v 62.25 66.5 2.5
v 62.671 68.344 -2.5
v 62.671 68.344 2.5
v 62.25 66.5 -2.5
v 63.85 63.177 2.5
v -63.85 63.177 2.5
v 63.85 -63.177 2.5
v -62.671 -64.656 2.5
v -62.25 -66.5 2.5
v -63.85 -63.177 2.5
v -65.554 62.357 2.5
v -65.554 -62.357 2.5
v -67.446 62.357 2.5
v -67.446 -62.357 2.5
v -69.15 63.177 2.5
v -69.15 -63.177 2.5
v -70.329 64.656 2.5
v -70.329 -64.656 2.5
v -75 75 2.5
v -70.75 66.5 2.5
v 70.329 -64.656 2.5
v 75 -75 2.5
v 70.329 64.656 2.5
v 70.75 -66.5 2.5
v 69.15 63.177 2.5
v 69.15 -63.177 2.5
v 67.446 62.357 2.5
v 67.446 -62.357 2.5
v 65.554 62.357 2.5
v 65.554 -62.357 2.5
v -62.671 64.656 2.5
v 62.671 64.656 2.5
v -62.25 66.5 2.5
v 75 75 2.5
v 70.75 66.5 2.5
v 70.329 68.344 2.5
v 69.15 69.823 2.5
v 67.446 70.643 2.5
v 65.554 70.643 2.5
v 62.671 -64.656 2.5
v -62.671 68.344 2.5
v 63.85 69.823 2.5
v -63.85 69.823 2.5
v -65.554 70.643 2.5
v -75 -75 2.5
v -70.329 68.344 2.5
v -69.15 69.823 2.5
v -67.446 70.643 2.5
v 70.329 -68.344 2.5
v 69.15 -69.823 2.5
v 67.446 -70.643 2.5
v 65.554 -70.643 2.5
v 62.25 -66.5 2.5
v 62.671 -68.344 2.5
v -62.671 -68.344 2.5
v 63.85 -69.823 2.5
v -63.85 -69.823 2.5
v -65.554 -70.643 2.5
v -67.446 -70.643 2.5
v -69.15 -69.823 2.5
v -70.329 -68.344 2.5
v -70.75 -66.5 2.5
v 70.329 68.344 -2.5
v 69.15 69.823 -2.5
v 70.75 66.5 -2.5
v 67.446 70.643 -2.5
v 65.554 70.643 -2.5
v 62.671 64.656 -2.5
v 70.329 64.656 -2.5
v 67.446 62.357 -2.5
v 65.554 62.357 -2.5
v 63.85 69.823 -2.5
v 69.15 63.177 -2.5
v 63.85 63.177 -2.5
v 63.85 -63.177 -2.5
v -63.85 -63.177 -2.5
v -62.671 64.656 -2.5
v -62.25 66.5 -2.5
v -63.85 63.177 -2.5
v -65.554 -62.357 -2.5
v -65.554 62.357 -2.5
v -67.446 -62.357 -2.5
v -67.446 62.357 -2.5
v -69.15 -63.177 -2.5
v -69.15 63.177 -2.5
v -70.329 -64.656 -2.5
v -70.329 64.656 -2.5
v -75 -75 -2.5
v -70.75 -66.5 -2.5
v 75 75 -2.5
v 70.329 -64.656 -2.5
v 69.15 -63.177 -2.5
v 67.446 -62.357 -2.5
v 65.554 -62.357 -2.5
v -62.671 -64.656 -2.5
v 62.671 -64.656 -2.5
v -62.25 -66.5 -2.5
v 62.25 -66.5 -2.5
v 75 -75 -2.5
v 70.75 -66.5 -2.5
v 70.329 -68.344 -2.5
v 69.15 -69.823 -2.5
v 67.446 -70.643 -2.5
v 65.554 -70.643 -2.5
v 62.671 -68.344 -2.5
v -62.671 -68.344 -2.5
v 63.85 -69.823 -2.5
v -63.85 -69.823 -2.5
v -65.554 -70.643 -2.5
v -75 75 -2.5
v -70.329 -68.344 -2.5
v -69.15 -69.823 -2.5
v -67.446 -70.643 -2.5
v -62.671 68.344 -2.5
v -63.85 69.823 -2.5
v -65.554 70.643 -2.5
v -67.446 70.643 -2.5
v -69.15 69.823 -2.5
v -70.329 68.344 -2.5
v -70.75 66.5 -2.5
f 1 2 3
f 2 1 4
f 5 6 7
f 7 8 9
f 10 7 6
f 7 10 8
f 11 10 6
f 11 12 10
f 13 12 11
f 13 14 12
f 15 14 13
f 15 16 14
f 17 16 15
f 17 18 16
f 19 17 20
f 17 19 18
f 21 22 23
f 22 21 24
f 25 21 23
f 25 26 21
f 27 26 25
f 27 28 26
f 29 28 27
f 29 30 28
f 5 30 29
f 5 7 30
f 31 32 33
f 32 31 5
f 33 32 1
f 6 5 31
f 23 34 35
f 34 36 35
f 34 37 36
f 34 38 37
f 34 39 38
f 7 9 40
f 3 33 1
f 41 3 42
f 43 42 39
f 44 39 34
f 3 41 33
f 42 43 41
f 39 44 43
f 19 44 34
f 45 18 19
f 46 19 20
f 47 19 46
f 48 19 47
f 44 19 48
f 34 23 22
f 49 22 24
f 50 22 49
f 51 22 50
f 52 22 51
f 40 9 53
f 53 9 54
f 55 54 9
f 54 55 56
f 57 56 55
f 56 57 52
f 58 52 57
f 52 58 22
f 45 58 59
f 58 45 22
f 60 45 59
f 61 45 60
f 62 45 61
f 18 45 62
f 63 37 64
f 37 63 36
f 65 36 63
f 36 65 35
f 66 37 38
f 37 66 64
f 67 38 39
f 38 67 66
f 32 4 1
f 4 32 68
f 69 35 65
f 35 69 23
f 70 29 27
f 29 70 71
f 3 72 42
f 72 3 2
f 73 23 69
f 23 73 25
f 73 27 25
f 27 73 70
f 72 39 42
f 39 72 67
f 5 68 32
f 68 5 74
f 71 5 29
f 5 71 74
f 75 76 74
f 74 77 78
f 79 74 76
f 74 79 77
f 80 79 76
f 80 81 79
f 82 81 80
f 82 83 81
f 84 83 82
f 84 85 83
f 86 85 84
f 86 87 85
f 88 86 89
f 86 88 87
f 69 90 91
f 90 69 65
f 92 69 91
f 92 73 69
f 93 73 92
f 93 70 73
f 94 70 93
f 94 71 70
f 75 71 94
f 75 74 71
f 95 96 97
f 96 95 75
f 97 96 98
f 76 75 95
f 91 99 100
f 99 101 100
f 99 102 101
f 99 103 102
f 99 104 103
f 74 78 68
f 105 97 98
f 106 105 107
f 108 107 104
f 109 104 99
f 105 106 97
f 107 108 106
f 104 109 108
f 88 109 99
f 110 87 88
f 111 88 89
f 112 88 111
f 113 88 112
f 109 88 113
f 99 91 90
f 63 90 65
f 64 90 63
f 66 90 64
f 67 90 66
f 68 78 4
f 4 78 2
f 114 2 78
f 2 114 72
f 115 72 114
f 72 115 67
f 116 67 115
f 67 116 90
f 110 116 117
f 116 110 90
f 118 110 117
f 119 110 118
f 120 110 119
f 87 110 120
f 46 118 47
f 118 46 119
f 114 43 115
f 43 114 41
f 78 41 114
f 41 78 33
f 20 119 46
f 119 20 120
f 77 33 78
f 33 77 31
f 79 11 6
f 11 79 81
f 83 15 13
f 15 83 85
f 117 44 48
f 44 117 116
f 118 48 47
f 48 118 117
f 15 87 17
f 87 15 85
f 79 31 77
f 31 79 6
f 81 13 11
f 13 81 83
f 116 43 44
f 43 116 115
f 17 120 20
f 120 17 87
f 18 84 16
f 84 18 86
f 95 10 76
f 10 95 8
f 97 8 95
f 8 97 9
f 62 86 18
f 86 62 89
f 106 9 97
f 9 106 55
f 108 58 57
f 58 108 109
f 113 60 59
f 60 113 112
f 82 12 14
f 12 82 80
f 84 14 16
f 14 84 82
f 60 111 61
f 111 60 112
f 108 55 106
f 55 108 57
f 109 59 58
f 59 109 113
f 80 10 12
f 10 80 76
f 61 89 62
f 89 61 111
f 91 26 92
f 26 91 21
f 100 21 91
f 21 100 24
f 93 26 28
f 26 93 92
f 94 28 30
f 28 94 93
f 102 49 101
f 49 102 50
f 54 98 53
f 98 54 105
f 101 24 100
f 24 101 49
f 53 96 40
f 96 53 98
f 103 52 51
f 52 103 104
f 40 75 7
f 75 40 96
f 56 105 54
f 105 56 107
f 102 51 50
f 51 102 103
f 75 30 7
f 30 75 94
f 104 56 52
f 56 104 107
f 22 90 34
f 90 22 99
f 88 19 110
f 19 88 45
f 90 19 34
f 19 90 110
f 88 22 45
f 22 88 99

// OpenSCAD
// Generated by SolidPython 1.1.3 on 2024-01-15 23:59:08


difference() {
	cube(center = true, size = [150, 150, 5]);
	union() {
		translate(v = [66.5000000000, 66.5000000000]) {
			cylinder(center = true, h = 5, r = 4.2500000000);
		}
		translate(v = [-66.5000000000, 66.5000000000]) {
			cylinder(center = true, h = 5, r = 4.2500000000);
		}
		translate(v = [-66.5000000000, -66.5000000000]) {
			cylinder(center = true, h = 5, r = 4.2500000000);
		}
		translate(v = [66.5000000000, -66.5000000000]) {
			cylinder(center = true, h = 5, r = 4.2500000000);
		}
	}
}
/***********************************************
*********      SolidPython code:      **********
************************************************
 
import solid
import numpy as np
import numbers
import pudb
from solid.utils import *
import viewscad
import subprocess
import os
import os.path as osp
import math
import sys

chamfer_extrude=solid.import_scad("./chamfer_extrude.scad")
chamfer_extrude=chamfer_extrude.chamfer_extrude
r = viewscad.Renderer(width=800, height=800)

def debug(model,f_name,path="/home/ts/code/projects/mfd/designs/debug"):
    solid.scad_render_to_file(model,osp.join(path,f_name)+".scad")
#generate position list of wells using offset from center
wells_pos_from_center_4 = lambda offset: [[-offset,offset],
                                        [offset, offset],
                                        [-offset, -offset],
                                        [offset, -offset]]
wells_pos_from_center_2 = lambda offset: [[offset,0],
                                        [-offset,0]]

def make_well(dims,shape=None,height=None,dxf=False):
    def circle_cylinder():
        if dxf or (height is None):
            well = solid.circle(r=dims, segments=64)
        else:
            well = solid.cylinder(r=dims, h=height, segments=64, center = True)
        return well
    if dims is None:
        sys.exit("radius needs to be a number")
    if isinstance(dims, numbers.Number):
        well =circle_cylinder()
    elif len(dims)==1:
        if isinstance(dims[1], numbers.Number):
            well =circle_cylinder()
        else:
            sys.exit("radius needs to be a number")
    elif len(dims)==2:
        well = solid.square(dims,center = True)
    elif len(dims)==3:
        well = solid.cube(dims, center = True)
    return well

def wells_top_bottom(center_gap,device_dims=None,shape=None,height=None, positions = None, dxf = False,well_shape=None):
    if well_shape == None:
        well_shape = make_well(device_dims,shape=shape,height=height,dxf=dxf)
    wells = []
    if positions is None:
        offset = radius+radius/2.0
        positions = wells_pos_from_center_2(offset)
    if dxf or (height is None):
        height = 0
    for position in positions:
        if dxf:
            wells.append(solid.translate([position[0],position[1]])(well_shape))
        else:
            wells.append(solid.translate([position[0],position[1],height/2.0])(well_shape))
    return  union()(*wells)

#place wells in four corners 
def four_corner(radius,height=None, positions = None, dxf = False):
    #if well pos not specified set
    #to equally spaced by half radius
    if positions is None:
        offset = radius+radius/2.0
        positions = wells_pos_from_center_4(offset)
    if dxf or (height is None):
        height = 0
    #make wells at positions with specified radius and height
    wells = []
    for position in positions:
        #make circle if making dxf
        if dxf:
            well_shape = solid.circle(r=radius, segments=64)
            well_shape = solid.translate([position[0],position[1]])(well_shape)
        #if stl make cylinder
        else:
            well_shape = solid.cylinder(r=radius, h=height, segments=64, center = True)
            well_shape = solid.translate([position[0],position[1],height/2.0])(well_shape)
        wells.append(well_shape)
    return  union()(*wells)

#generate channels 
def make_channels(length,width,height=0,num_chans=1,max_chans=None,spacing=None, dxf = False,
                  rotate_channels=False):
    if dxf or (height is None):
        height = 0
    #if channel gap not defined, is equal to
    if spacing is None: spacing = width
    #calculate number of channels if fitting max num within given width
    if not max_chans is None:
        import math
        num_chans = math.floor((max_chans-spacing)/(width+spacing))
    #get total width of channel section  
    total_width = (width*num_chans)+(spacing*(num_chans-1))

    #make template channel
    #if rotate_channels: width, length = length, width
    if dxf:
        channel_t = solid.square([length,width],center = True)
    else:
        channel_t = solid.cube([length,width,height], center = True)

    #if number channels is even, offset the first channel to center its gap
    if num_chans % 2 == 0: centering = -(width/2.0+spacing/2.0)
    else: centering = 0
    #move template channel up to align bottom at z = 0 
    #and offset center if necessary
    if dxf:
        channel_t = solid.translate([0,centering])(channel_t)
    else:
        channel_t = solid.translate([0,centering,height/2.0])(channel_t)

    #if rotate_channels: length,width = width,length
    #start making the channels
    channels = []
    for i in range(num_chans):
        #if i=0 there is no translation
        #if i=1, we make the first channel adjacent to second
        direction = i

        #if i>=1, we add channels alternating left and right
        if i >= 1:
            direction = -(i/2.0)
            if i % 2 == 1: direction = (-direction)+0.5
                
        #make channel at right position and add it to channel list
        translation_coords = [0,direction*(width+spacing)]
        #if rotate_channels: translation_coords = [direction*(width+spacing),0]
        if dxf:
            channel = solid.translate(translation_coords)(channel_t)
        else:
            channel = solid.translate([*translation_coords,0])(channel_t)
        channels.append(channel)
    
    #group all channels as one object
    channels = union()(*channels)
    #compute the x,y,z dimensions in order to pass as arguments 
    #for construction of other parts of device (such as the chambers)
    measurements = {'x':(length/2.0,-length/2.0),
                    'y':(total_width/2.0,-total_width/2.0)}
    if not dxf:
        measurements['z'] = (height,0)
    if rotate_channels:
        channels = solid.rotate(90)(channels)
        measurements['x'],measurements['y']=measurements['y'],measurements['x']
    return channels,measurements

def make_chambers(msrs,height=None,extra=0,len_until=None,width=None, dxf = False):
    #computes x,y,z length
    total = lambda x : abs(x[0]) + abs(x[1])
    
    #if specific height if specified
    #otherwise use same height as channels
    if dxf:
        pass
    elif not height is None:
        msrs['z'] = (height,0)
    else:
        msrs['z'] = (0,0)
        
    #make copy of measurements from channels to modify chamber dimensions 
    #and add length to chambers as specified
    chamber_dims = msrs.copy()
    #calculate length of chamber to reach specified offset
    if not len_until is None:
        chamber_len = len_until-(msrs['x'][0])
    #or add specified length to channel length (if not specified, adds 0)
    else:
        chamber_len = msrs['x'][0]+extra
    #set the chamber length based 
    chamber_dims['x'] = (chamber_len/2.0,-(chamber_len/2.0))
    #compute final dimensions of chamber
    if not width is None:
        chamber_dims['y'] = (width/2.0,-width/2.0)
    chamber_dims = [total(size) for size in chamber_dims.values()]
        
    #calculate chamber translation offset to place adjacent to channels
    chamber_trslt = msrs['x'][0]+(chamber_len/2.0)
    #compute chamber translation coordinates to align with channels
    #x = 1 moves chamber above channels
    #x = -1 moves chamber below channels
    if dxf:
        trslt = lambda x : [x*(chamber_trslt),0]
    else:
        trslt = lambda x : [x*(chamber_trslt),0,msrs['z'][0]/2.0]
    
    #function to make chamber at top or at bottom 
    if dxf:
        move = lambda x : solid.translate(trslt(x))(solid.square(chamber_dims, center = True) )
    else:
        move = lambda x : solid.translate(trslt(x))(solid.cube(chamber_dims,center = True))
    #make top and bottom chambers and return them as grouped
    top = move(1)
    bottom = move(-1)
    #chambers=solid.rotate(90)(solid.union()(top,bottom))
    chambers=(solid.union()(top,bottom))

    return chambers

#create alignment features 
def alignment_features(unit,dims,grid_size, mask_size = None, alignment = "hollow", units_from_center = (2.5,2.5), corner_len=None):
    width = grid_size[0]*dims[0]
    length = grid_size[1]*dims[1]
    if mask_size is None and corner_len is None:
        corner_len = (dims[0] + dims[1]) /2 / 8
    corner = lambda thickness_div : solid.union()( solid.square([corner_len,corner_len/thickness_div],center=False), solid.square([corner_len/thickness_div,corner_len],center=False) )
    
    def make_full(thickness_div):
        thickness = corner_len/thickness_div
        tr = solid.translate([0, 0, 0 ])(solid.rotate(180)(corner(thickness_div)))
        tr = solid.translate([thickness/2,thickness/2,0])(tr)
        bl = solid.translate([0, 0, 0 ])(solid.rotate(0)(corner(thickness_div)))
        bl = solid.translate([-thickness/2,-thickness/2,0])(bl)
        return solid.union()(tr,bl)
    
    def make_hollow(thickness_div):
        thickness = corner_len/(thickness_div/2)
        inner = make_full(thickness_div)
        outer = make_full(thickness_div/2)
        hollow = outer - inner 
        return hollow
    
    center = (width /2 , length/2)
    mask_pos = lambda x,y : (center[0] + x*(float(units_from_center[0])*dims[0]), center[1] + y*(float(units_from_center[1])*dims[1]))
    positions = []
    positions.append(mask_pos(1,0))
    positions.append(mask_pos(0,1))
    positions.append(mask_pos(-1,0))
    positions.append(mask_pos(0,-1))
    make_mask = lambda mtype : make_hollow(8) if mtype == "hollow" else make_full(8)
    masks = [ solid.translate([*position,0])(make_mask(alignment)) for position in positions]
    
    solid.scad_render_to_file(solid.union()(*masks),"./designs/open_chamber/masks.scad")
    #return unit - solid.union()(*masks)
    return solid.union()(*masks,unit)

def create_outline(thickness, array, dims, grid_size,):
    width = grid_size[0]*dims[0] + thickness *2
    length = grid_size[1]*dims[1] + thickness *2
    outer = solid.translate([-thickness, -thickness,0])(solid.square([width, length]))
    return outer-array

def create_wall(wall_thickness, outline_thickness, dims, grid_size, wall_height = 2000, dxf = False):
    inner_width = grid_size[0]*dims[0] + outline_thickness *2
    inner_length = grid_size[1]*dims[1] + outline_thickness *2
    outer_width = inner_width + wall_thickness * 2
    outer_length = inner_length + wall_thickness * 2
    outer_pos_x = -outline_thickness-wall_thickness
    outer_pos_y = -outline_thickness-wall_thickness
    inner_pos_x = -outline_thickness
    inner_pos_y = -outline_thickness
    if dxf:
        inner_wall = solid.translate([inner_pos_x,
                                      inner_pos_y,
                                      0])(solid.square([inner_width, inner_length]))
        outer_wall = solid.translate([outer_pos_x,
                                      outer_pos_y,
                                      0])(solid.square([outer_width, outer_length]))

        return outer_wall-inner_wall
    else:
        inner_wall = solid.translate([inner_pos_x,
                                      inner_pos_y,
                                      0])(solid.cube([inner_width, inner_length,wall_height]))
        outer_wall = solid.translate([outer_pos_x,
                                      outer_pos_y,
                                      0])(solid.cube([outer_width, outer_length,wall_height]))

        return outer_wall-inner_wall, {'wall_height': wall_height,
                                       'wall_thickness': wall_thickness,
                                       'inner_width':inner_width,
                                       'inner_length': inner_length,
                                       'outer_width': outer_width,
                                       'outer_length': outer_length,
                                       'outer_pos_x' : outer_pos_x,
                                       'outer_pos_y' : outer_pos_y,
                                       'inner_pos_x' : inner_pos_x,
                                       'inner_pos_y' : inner_pos_y}

def create_thicker_wall(wall_thickness, outer_wall_offset, wall_dims, dims, grid_size, height_start = .2, height_end=2, dxf = False):
    addon_wall,thicker_wall_dims = create_wall(wall_thickness, outer_wall_offset, dims, grid_size, wall_height=height_end-height_start, dxf = False)
    addon_wall = solid.translate([0,0,height_start])(addon_wall)

    thicker_wall_dims['wall_height'] = height_end
    thicker_wall_dims['wall_thickness'] = wall_dims['wall_thickness'] + wall_thickness
    return addon_wall, thicker_wall_dims
 
def add_lock_to_wall(wall,wall_dims,y_offset = 0,cut_ratio=0.7,L_length=3, gap_ratio=0.05, axis="x",width_ratio=1/2):
    # Makes L shape
    def make_L(max_length,length_thickness,max_width,width_thickness,height,y_offset):
        length = solid.cube([max_length,length_thickness,height])
        width = solid.cube([width_thickness,max_width,height])
        width = solid.translate([max_length-(width_thickness),0,0])(width)
        L = solid.union()(width,length)
        debug(L,"L")
        if axis == "x":
            L = solid.rotate(-90)(L)
            L = solid.translate([0,max_length,0])(L)
        else:
            L = solid.rotate(-180)(L)
            L = solid.translate([max_length,max_width,0])(L)
        return solid.translate([0,0,y_offset])(L)
    
    lock_length = L_length
    lock_width = wall_dims['wall_thickness']*width_ratio
    lock_length_thickness = lock_width/2
    lock_width_thickness = lock_width/2
    L_lock = make_L(lock_length,lock_length_thickness,lock_width,lock_width_thickness, wall_dims['wall_height']-y_offset, y_offset)
    
    margin_space = lock_length - lock_length*(1-gap_ratio)
    key_length = lock_length-margin_space
    key_length_thickness = lock_length_thickness-(margin_space*2)
    key_width = lock_width-(margin_space*2)
    key_width_thickness = lock_width_thickness-(margin_space*2)
    L_key = make_L(key_length,key_length_thickness,key_width,key_width_thickness, wall_dims['wall_height']-y_offset, y_offset)
    L_key = solid.translate([margin_space,margin_space,0])(L_key)
    L = solid.union()(L_lock,L_key)
    debug(L,"L")
    
    #Make cube to be used as negative to split frame in a half
    #Can choose if making left or right negative, specify ratio of split
    def make_negative(right,cut_ratio):
        if axis == "x":
            if right:
                length = wall_dims['outer_length']*(1-cut_ratio)
                pos_x = wall_dims['outer_pos_x']+(wall_dims['outer_length']*cut_ratio)
            else:
                length = wall_dims['outer_length']*(cut_ratio)
                pos_x = wall_dims['outer_pos_x'] 
            negative = solid.cube([wall_dims['outer_width'],length, wall_dims['wall_height']])
            negative = solid.translate([wall_dims['outer_pos_y'],pos_x,0])(negative)
        else:
            if right:
                length = wall_dims['outer_width']*(1-cut_ratio)
                pos_x = wall_dims['outer_pos_y']+(wall_dims['outer_width']*cut_ratio)
            else:
                length = wall_dims['outer_width']*(cut_ratio)
                pos_x = wall_dims['outer_pos_y'] 
            negative = solid.cube([length,wall_dims['outer_length'], wall_dims['wall_height']])
            negative = solid.translate([pos_x,wall_dims['outer_pos_x'],0])(negative)
        return negative, pos_x, length 
                      
    #Make negatives
    negative_right, right_half_pos_x, right_half_length = make_negative(True,cut_ratio)
    negative_left, left_half_pos_x, right_half_length = make_negative(False,cut_ratio)
    #Make halves
    left_half = solid.difference()(wall,negative_right)
    right_half = solid.difference()(wall,negative_left)
    def place_L(L, L_length,L_width):
        #Place L on top wall       
        offset_to_center = (wall_dims['wall_thickness']-L_width)/2
        if axis == "x":
            y_pos_top = (wall_dims['outer_pos_y'] +
                    wall_dims['outer_width'] - 
                    L_width - offset_to_center)
            top_L = solid.translate([y_pos_top,
                                     right_half_pos_x-(L_length),
                                     0])(L)
            #Place L on bottom wall       
            y_pos_bottom = wall_dims['outer_pos_y']+offset_to_center
            bottom_L = solid.translate([y_pos_bottom,
                                        right_half_pos_x-L_length,
                                        0])(L)
        else:
            y_pos_top = (wall_dims['outer_pos_x'] +
                    wall_dims['outer_length'] -
                    (L_width+offset_to_center))
            top_L = solid.translate([right_half_pos_x-L_length,
                                     y_pos_top,
                                     0])(L)
            #Place L on bottom wall       
            y_pos_bottom = wall_dims['outer_pos_y']+offset_to_center
            bottom_L = solid.translate([right_half_pos_x-L_length,
                                        y_pos_bottom,
                                        0])(L)
        return bottom_L, top_L
    #Make complimentary L pieces through union and differences
    #Make Lock
    bottom_L_lock, top_L_lock = place_L(L_lock,L_length,lock_width)
    left_half = solid.difference()(left_half,bottom_L_lock)
    left_half = solid.difference()(left_half,top_L_lock)
    #Make Key
    bottom_L_key, top_L_key = place_L(L_key,L_length,lock_width)
    right_half = solid.union()(right_half,bottom_L_key)
    right_half = solid.union()(right_half,top_L_key)
    return left_half, right_half


#build a row x col grid of containment units
def make_unit_array(unit,dims,grid_size, dxf = False, alignment = None, mask_size = None,
                    units_from_center = None,alignment_offset=None, alignment_mark_size=1):
    units = []
    for col in range(grid_size[1]):
        for row in range(grid_size[0]):
            if dxf:
                units.append(solid.translate([row*dims[0],col*dims[1]])(unit))
            else:
                units.append(solid.translate([row*dims[0],col*dims[1],dims[2]/2.0])(unit))
    array = solid.union()(*units)
    if (not alignment is None) and dxf:
        if not alignment_offset is None:
            array = solid.translate([alignment_offset[0],alignment_offset[1]])(array)
        array = alignment_features(array,dims, grid_size, alignment = alignment, mask_size = None, units_from_center = units_from_center,corner_len=alignment_mark_size)
        if not alignment_offset is None:
            array = solid.translate([-alignment_offset[0],-alignment_offset[1]])(array)
    return array


def make_taylor(wells_pos = wells_pos_from_center_4(2.25), well_rad = 1.5 ,
                well_height = 2, chan_w = 0.01, chan_l = 1, chan_h = 0.010 ,
                chan_gap = 0.040, max_chans = None,num_chans=100, chamber_height  = 0.100,
                columns = 1, rows = 1, chamber_len_until=2.25, add_channels = True, add_wells = True, 
                add_chambers = True, save_path = "./", alignment = None, units_from_center = 2,
                mask_size = None, render_stl = False, outline_thickness = 0.050, dxf = True,
                wall_height = 15, wall_thickness = 0.95, casing_x=9, casing_y=9, casing_z=0,rotate_units=0):

    dims = [casing_x, casing_y, casing_z]
    wells = four_corner(well_rad,well_height, dxf = dxf, positions = wells_pos)
    debug(wells,"wells")
    channels, msrs = make_channels(chan_l,chan_w,chan_h,dxf=dxf, spacing = chan_gap, max_chans=max_chans,num_chans=num_chans)
    debug(channels,"channels")
    chambers = make_chambers(msrs,dxf = dxf, height=chamber_height,len_until=chamber_len_until)
    debug(chambers,"chambers")

    #add together and render
    device_parts = []
    if add_channels:
        device_parts.append(channels)
    if add_wells:
        device_parts.append(wells)
    if add_chambers:
        device_parts.append(chambers)
    device=union()(*device_parts)
    device = rotate(rotate_units)(device)

    device=solid.translate([dims[0]/2.0,dims[1]/2.0,0])(device)
    channels = rotate(rotate_units)(channels)
    channels=solid.translate([dims[0]/2,dims[1]/2,0])(channels)
    chambers_wells = union()(wells,chambers)
    chambers_wells = rotate(rotate_units)(chambers_wells)
    chambers_wells=solid.translate([dims[0]/2,dims[1]/2,0])(chambers_wells)

    file_name = str(rows)+'x'+str(columns)+'_units_'
    grid_size = [rows,columns]

    if alignment:
        alignment="full"
    device = make_unit_array(device,dims,grid_size, dxf=dxf, alignment = alignment,
                                 units_from_center = units_from_center)
    channels = make_unit_array(channels,dims,grid_size, dxf=dxf, alignment = alignment,
                                 units_from_center = units_from_center)
    if alignment=="full":
        alignment="hollow"

    chambers_wells = make_unit_array(chambers_wells,dims,grid_size, dxf=dxf, alignment = alignment,
                                 units_from_center =units_from_center)

    def save_model(model,prefix):
        model_fname = os.path.abspath(save_path+prefix+"_"+file_name+".scad")
        solid.scad_render_to_file(model,model_fname)
        return model_fname

    wells_fname = save_model(wells,"wells")
    channels_fname = save_model(channels,"channels")
    device_fname = save_model(device,"device")
    chambers_wells_fname = save_model(chambers_wells,"chambers_wells")
    return (chambers_wells,chambers_wells_fname), (channels,channels_fname), (device,device_fname)

def make_device(design='open',rows=8,columns=6,wells_pos = 4.5,well_offset=3.2, well_rad=3.2,well_height=0.1,
                chan_l=1,chan_w=0.01,chan_h=0.01,chan_gap=0.015,num_chans=101,dxf=True,save_path="./designs/open_chamber/",
                casing_x=9.0,casing_y=18.0,casing_z=0,rotate_units=90,units_from_center=(3,1),chamber_len_until=4.5,
                chamber_width=None,alignment=True, add_wells=True, add_channels=True,add_chambers=True,well_shape=None):

    dims = [casing_x, casing_y, casing_z]
    if design == "open":
        wells_pos=wells_pos_from_center_2(wells_pos)
        wells = wells_top_bottom(well_offset*2,device_dims=well_rad,height=well_height, dxf = dxf, positions = wells_pos,well_shape=well_shape)
    elif design == "closed":
        wells_pos=wells_pos_from_center_4(wells_pos)
        debug(wells,"wells")
        wells = four_corner(well_offset,well_height,device_dims=well_rad, dxf = dxf, positions = wells_pos)
    else:
        print(design+" is not a valid design.\n Choose valid design: 'open' or 'closed'")
        exit()
    wells = rotate(rotate_units)(wells)
    wells=solid.translate([dims[0]/2,dims[1]/2,0])(wells)
    debug(wells,"wells")

    channels, msrs = make_channels(chan_l,chan_w,chan_h,dxf=dxf, spacing = chan_gap, num_chans=num_chans,rotate_channels=False)
    channels = rotate(rotate_units)(channels)
    channels=solid.translate([dims[0]/2,dims[1]/2,0])(channels)

    chambers=make_chambers(msrs,height=None,extra=0,len_until=chamber_len_until, width=chamber_width,dxf = dxf)
    chambers = rotate(rotate_units)(chambers)
    chambers=solid.translate([dims[0]/2,dims[1]/2,0])(chambers)

    device_parts = []
    if add_channels:
        device_parts.append(channels)
    if add_wells:
        device_parts.append(wells)
    if add_chambers:
        device_parts.append(chambers)
    device = union()(*device_parts)
    #device = rotate(rotate_units)(device)
    #device=solid.translate([dims[0]/2.0,dims[1]/2.0,0])(device)

    chambers_wells = []
    if add_chambers:
        chambers_wells.append(chambers)
    if add_wells:
        chambers_wells.append(wells)
    chambers_wells = union()(*chambers_wells)
    #chambers_wells = union()(wells,chambers)
    #chambers_wells = rotate(rotate_units)(chambers_wells)
    #chambers_wells=solid.translate([dims[0]/2,dims[1]/2,0])(chambers_wells)

    file_name = str(rows)+'x'+str(columns)+'_units_'

    grid_size = [rows,columns]
    if alignment:
        alignment="full"
    device = make_unit_array(device,dims,grid_size, dxf=dxf, alignment = alignment,
                                 units_from_center = units_from_center)
    channels = make_unit_array(channels,dims,grid_size, dxf=dxf, alignment = alignment,
                                 units_from_center = units_from_center)
    if alignment=="full":
        alignment="hollow"

    chambers_wells = make_unit_array(chambers_wells,dims,grid_size, dxf=dxf, alignment = alignment,
                                 units_from_center =units_from_center)

    def save_model(model,prefix):
        model_fname = os.path.abspath(save_path+prefix+"_"+file_name+".scad")
        solid.scad_render_to_file(model,model_fname)
        return model_fname

    wells_fname = save_model(wells,"wells")
    channels_fname = save_model(channels,"channels")
    device_fname = save_model(device,"device")
    chambers_wells_fname = save_model(chambers_wells,"chambers_wells")
    return (chambers_wells,chambers_wells_fname), (channels,channels_fname), (device,device_fname)


def make_open_chamber(rows=8,columns=6,wells_pos = wells_pos_from_center_2(4.5), well_rad=3.2,well_height=0.1,
                      chan_l=1,chan_w=0.01,chan_h=0.01,chan_gap=0.015,num_chans=101,dxf=True,save_path="./designs/open_chamber/",
                      casing_x=9.0,casing_y=18.0,casing_z=0,rotate_units=90,units_from_center=(3,1),chamber_len_until=4.5,
                      chamber_width=None,alignment=True, add_wells=True, add_channels=True,add_chambers=True,well_shape=None):

    dims = [casing_x, casing_y, casing_z]
    wells = wells_top_bottom(well_rad,height=well_height, dxf = dxf, positions = wells_pos, well_shape=well_shape)
    channels, msrs = make_channels(chan_l,chan_w,chan_h,dxf=dxf, spacing = chan_gap, num_chans=num_chans,rotate_channels=False)
    chambers=make_chambers(msrs,height=None,extra=0,len_until=chamber_len_until, width=chamber_width,dxf = dxf)
    debug(chambers,"chambers")
    device_parts = []
    if add_channels:
        device_parts.append(channels)
    if add_wells:
        device_parts.append(wells)
    if add_chambers:
        device_parts.append(chambers)
    device = union()(*device_parts)
    device = rotate(rotate_units)(device)
    device=solid.translate([dims[0]/2.0,dims[1]/2.0,0])(device)
    channels = rotate(rotate_units)(channels)
    channels=solid.translate([dims[0]/2,dims[1]/2,0])(channels)
    chambers_wells = union()(wells,chambers)
    chambers_wells = rotate(rotate_units)(chambers_wells)
    chambers_wells=solid.translate([dims[0]/2,dims[1]/2,0])(chambers_wells)

    file_name = str(rows)+'x'+str(columns)+'_units_'

    grid_size = [rows,columns]
    if alignment:
        alignment="full"
    device = make_unit_array(device,dims,grid_size, dxf=dxf, alignment = alignment,
                                 units_from_center = units_from_center)
    channels = make_unit_array(channels,dims,grid_size, dxf=dxf, alignment = alignment,
                                 units_from_center = units_from_center)
    if alignment=="full":
        alignment="hollow"

    chambers_wells = make_unit_array(chambers_wells,dims,grid_size, dxf=dxf, alignment = alignment,
                                 units_from_center =units_from_center)

    def save_model(model,prefix):
        model_fname = os.path.abspath(save_path+prefix+"_"+file_name+".scad")
        solid.scad_render_to_file(model,model_fname)
        return model_fname

    wells_fname = save_model(wells,"wells")
    channels_fname = save_model(channels,"channels")
    device_fname = save_model(device,"device")
    chambers_wells_fname = save_model(chambers_wells,"chambers_wells")
    return (chambers_wells,chambers_wells_fname), (channels,channels_fname), (device,device_fname)

def to_dxf(scad_path):
    dxf_path = scad_path.replace(".scad",".dxf")
    subprocess.call(["openscad", "-o", dxf_path, scad_path])
    import ezdxf
    temp_dxf = ezdxf.readfile(dxf_path)
    temp_dxf.saveas(dxf_path)

#def make_walls(diameter,thickness,grid_size,dims,height=20,segments=256,make_inner=True):
#    wafer_wall_out = solid.cylinder(r=diameter/2,h=height, segments=segments)
#    wafer_wall_in = solid.cylinder(r=(diameter/2-thickness),h=height, segments=segments)
#    wafer_wall = solid.difference()(wafer_wall_out,wafer_wall_in)
#    wafer_wall = solid.translate([grid_size[1]*dims[1]/2.0,grid_size[0]*dims[0]/2.0])(wafer_wall)
#
#    vertical_wall_length = grid_size[1]*dims[1]
#    horizontal_wall_length = grid_size[0]*dims[0]
#    vertical_wall = solid.cube([vertical_wall_length,thickness,height],center = True)
#    vertical_wall = solid.translate([vertical_wall_length/2,0,height/2])(vertical_wall)
#    horizontal_wall = solid.cube([thickness,horizontal_wall_length,height],center = True)
#    horizontal_wall = solid.translate([0,vertical_wall_length/2,height/2])(horizontal_wall)
#    walls = []
#    walls.append(horizontal_wall)
#    walls.append(vertical_wall)
#    for col in range(grid_size[1]):
#        if col == grid_size[1]-1: 
#            walls.append(solid.translate([0,(col+1)*dims[1]])(vertical_wall))
#        elif col > 0 and col < grid_size[1]-1 and make_inner==True:
#            walls.append(solid.translate([0,(col+1)*dims[1]])(vertical_wall))
#    for row in range(grid_size[0]):
#        if row == grid_size[0]-1: 
#            walls.append(solid.translate([(row+1)*dims[0],0])(horizontal_wall))
#        elif row > 0 and row < grid_size[0]-1 and make_inner==True:
#            walls.append(solid.translate([(row+1)*dims[0],0])(horizontal_wall))
#    walls = union()(*walls)
#    wafer_walls = union()(walls,wafer_wall)
#    return walls,wafer_wall,wafer_walls

def make_walls(diameter,thickness,grid_size,dims,height=20,segments=256,make_inner=True,padx=0,pady=0):
    wafer_wall_out = solid.cylinder(r=diameter/2,h=height, segments=segments)
    wafer_wall_in = solid.cylinder(r=(diameter/2-thickness),h=height, segments=segments)
    wafer_wall = solid.difference()(wafer_wall_out,wafer_wall_in)
    wafer_wall = solid.translate([grid_size[1]*dims[1]/2.0,grid_size[0]*dims[0]/2.0])(wafer_wall)

    vertical_wall_length = grid_size[0]*dims[0]+padx
    horizontal_wall_length = grid_size[1]*dims[1]+pady
    vertical_wall = solid.cube([vertical_wall_length,thickness,height],center = True)
    vertical_wall = solid.translate([vertical_wall_length/2-pady/2,-padx/2,height/2])(vertical_wall)
    horizontal_wall = solid.cube([thickness,horizontal_wall_length,height],center = True)
    horizontal_wall = solid.translate([-pady/2,horizontal_wall_length/2-padx/2,height/2])(horizontal_wall)
    walls = []
    walls.append(horizontal_wall)
    walls.append(vertical_wall)
    for col in range(grid_size[1]):
        if col == grid_size[1]-1: 
            walls.append(solid.translate([0,(col+1)*dims[1]+pady])(vertical_wall))
        elif col > 0 and col < grid_size[1]-1 and make_inner==True:
            walls.append(solid.translate([0,(col+1)*dims[1]])(vertical_wall))
    for row in range(grid_size[0]):
        if row == grid_size[0]-1: 
            walls.append(solid.translate([(row+1)*dims[0]+padx,0])(horizontal_wall))
        elif row > 0 and row < grid_size[0]-1 and make_inner==True:
            walls.append(solid.translate([(row+1)*dims[0],0])(horizontal_wall))
    walls = union()(*walls)
    wafer_walls = union()(walls,wafer_wall)
    return walls,wafer_wall,wafer_walls

def save_model(model,base_path,base_name,dxf=True):
    if not os.path.exists(base_path):
        os.makedirs(base_path)
    dxf_path=osp.join(base_path,base_name+".scad")
    solid.scad_render_to_file(model,osp.join(dxf_path))
    if dxf:
        to_dxf(dxf_path)

def make_wafer(diameter,flat_len,thickness):
    wafer = solid.cylinder(r1=diameter/2,r2=diameter/2,h=thickness,segments=512,)()
    x_start_flat=(flat_len/2)
    y_start_flat = math.sqrt(((diameter/2)**2) - (x_start_flat**2) )
    height_delete_flat=diameter/2-y_start_flat
    flat_delete = solid.cube([flat_len,height_delete_flat,thickness],center=False)()
    flat_delete = solid.translate([-flat_len/2,y_start_flat,0])(flat_delete)
    wafer = solid.difference()(wafer,flat_delete)
    wafer = solid.rotate(90)(wafer)
    return wafer

def add_wafer_to_mask(wafer_size,flat_len,mask,grid_size,dims,wafer_line_thickness=0.1,outer_mask_thickness=5,alignment_offset=None):
    def make_wafer_mask(wafer_size,flat_len):
        wafer_mask = make_wafer(wafer_size,flat_len,1)
        wafer_mask = solid.projection()(wafer_mask)
        wafer_mask = solid.translate([grid_size[0]*dims[0]/2.0,grid_size[1]*dims[1]/2.0])(wafer_mask)
        if not alignment_offset is None:
            wafer_mask = solid.translate([-alignment_offset[0],-alignment_offset[1]])(wafer_mask)
        return wafer_mask

    inner_wafer_line_mask = make_wafer_mask(wafer_size-wafer_line_thickness/2,flat_len)
    outer_wafer_line_mask = make_wafer_mask(wafer_size+wafer_line_thickness/2,flat_len)
    outer_wafer_mask = make_wafer_mask(wafer_size+outer_mask_thickness,flat_len)
    outer_wafer_mask = solid.difference()(outer_wafer_mask,outer_wafer_line_mask)
    wafer_mask = solid.union()(outer_wafer_mask,inner_wafer_line_mask)

    return solid.difference()(wafer_mask,mask)

def make_posts(post_shape,post_height):
    posts = solid.linear_extrude(height=post_height)(post_shape)
    return posts

def make_wafer_empty(diameter,flat_len,thickness,margin,notch_len=20,notch_height=5,oversize=1.01):
    diameter*=oversize
    flat_len*=oversize
    wafer = make_wafer(diameter,flat_len,thickness)
    holder = solid.cylinder(r1=diameter/2+margin,r2=diameter/2+margin,h=thickness,segments=512)()
    holder = solid.difference()(holder,wafer)

    x_start_flat=(flat_len/2)
    y_start_flat = math.sqrt(((diameter/2)**2) - (x_start_flat**2) )
    height_delete_flat=diameter/2-y_start_flat
    notch = solid.cube([notch_len,notch_height,thickness],center=False)()
    notch = solid.translate([-notch_len/2,y_start_flat,0])(notch)
    notch = solid.rotate(90)(notch)
    return solid.difference()(holder,notch)

def wafer_print_calibration(diameter,thickness,height,z_offset):
    circles = []
    radii = []
    radii.append(diameter/2.0*0.8)
    radii.append(diameter/2.0*0.6)
    radii.append(diameter/2.0*0.4)
    radii.append(diameter/2.0*0.2)
    for radius in radii:
        inner = solid.cylinder(r1=radius-(thickness/2.0),r2=radius-(thickness/2.0),h=thickness,segments=512,)()
        outer = solid.cylinder(r1=radius+(thickness/2.0),r2=radius+(thickness/2.0),h=thickness,segments=512,)()
        diff = solid.difference()(outer,inner)
        circles.append(diff)
    circles = solid.union()(*circles)
    circles = solid.translate([0,0,z_offset])(circles)
    return circles

def make_rack(wells,dims,grid_size,alignment_offset,rack_x,rack_y,rack_thickness,bolt_width,add_bolts=True):

    #get X and Y dimensions of gride of pipette tips
    X_len = dims[0]*grid_size[0]
    Y_len = dims[1]*grid_size[1]
    #make rack
    rack = solid.cube([rack_x,rack_y,rack_thickness],center=True)

    if add_bolts:
    #add bolt holes
        bolt_hole=solid.cylinder(r=bolt_width/2,h=rack_thickness,center=True)()
        bolt_holes = []
        bolt_holes.append(solid.translate([rack_x/2-1.5*bolt_width,rack_y/2-1.5*bolt_width])(bolt_hole))
        bolt_holes.append(solid.translate([-rack_x/2+1.5*bolt_width,rack_y/2-1.5*bolt_width])(bolt_hole))
        bolt_holes.append(solid.translate([-rack_x/2+1.5*bolt_width,-rack_y/2+1.5*bolt_width])(bolt_hole))
        bolt_holes.append(solid.translate([rack_x/2-1.5*bolt_width,-rack_y/2+1.5*bolt_width])(bolt_hole))
        bolt_holes = solid.union()(*bolt_holes)
        rack=solid.difference()(rack,bolt_holes)
    rack_support = rack

    #center rack with pipette holes
    rack = solid.translate([0,0,rack_thickness/2])(rack)
    rack = solid.translate([X_len/2,Y_len/2])(rack)
    rack = solid.translate([-alignment_offset[0],-alignment_offset[1]])(rack)
    wells = solid.linear_extrude(height=rack_thickness)(wells)
    rack = solid.difference()(rack,wells)
    return rack, rack_support

def make_pillar(wells,dims,grid_size,alignment_offset,rack_x,rack_y,pillar_height,rack_thickness,bolt_width,add_bolts=True,taper_angle=1,bolt_position_corner=1.5):

    #get X and Y dimensions of gride of pipette tips
    X_len = dims[0]*grid_size[0]
    Y_len = dims[1]*grid_size[1]
    #make rack
    rack = solid.cube([rack_x,rack_y,rack_thickness],center=True)
    
    if add_bolts:
    #add bolt holes
        bolt_hole=solid.cylinder(r=bolt_width/2,h=rack_thickness,center=True)()
        bolt_holes = []
        bolt_holes.append(solid.translate([rack_x/2-bolt_position_corner*bolt_width,rack_y/2-bolt_position_corner*bolt_width])(bolt_hole))
        bolt_holes.append(solid.translate([-rack_x/2+bolt_position_corner*bolt_width,rack_y/2-bolt_position_corner*bolt_width])(bolt_hole))
        bolt_holes.append(solid.translate([-rack_x/2+bolt_position_corner*bolt_width,-rack_y/2+bolt_position_corner*bolt_width])(bolt_hole))
        bolt_holes.append(solid.translate([rack_x/2-bolt_position_corner*bolt_width,-rack_y/2+bolt_position_corner*bolt_width])(bolt_hole))
        bolt_holes = solid.union()(*bolt_holes)
        rack=solid.difference()(rack,bolt_holes)
    rack_support = rack

    #center rack with pipette holes
    #rack = solid.translate([0,0,-rack_thickness])(rack)
    rack = solid.translate([X_len/2,Y_len/2])(rack)
    rack = solid.translate([-alignment_offset[0],-alignment_offset[1]])(rack)
    if not taper_angle == 0:
        wells=chamfer_extrude(pillar_height,taper_angle,segments=20)(wells)
    else:
        wells = solid.linear_extrude(height=pillar_height)(wells)
    rack = solid.union()(rack,wells)
    return rack, rack_support

def deg_taper_len(height,deg):
    if not deg == 0:
        return height*math.tan(math.radians(deg))
    else:
        return 0

def make_outline(inner_dims,wall_thickness,grid_size,dims,alignment_offset):
    inner_dims=np.array(inner_dims)
    inner_outline=solid.square(inner_dims,center=True)
    outer_dims=inner_dims+wall_thickness
    outer_outline=solid.square(outer_dims,center=True)
    outline=solid.difference()(outer_outline,inner_outline)
    outline=solid.translate([grid_size[0]*dims[0]/2.0,grid_size[1]*dims[1]/2.0])(outline)
    return outline








 
 
************************************************/
